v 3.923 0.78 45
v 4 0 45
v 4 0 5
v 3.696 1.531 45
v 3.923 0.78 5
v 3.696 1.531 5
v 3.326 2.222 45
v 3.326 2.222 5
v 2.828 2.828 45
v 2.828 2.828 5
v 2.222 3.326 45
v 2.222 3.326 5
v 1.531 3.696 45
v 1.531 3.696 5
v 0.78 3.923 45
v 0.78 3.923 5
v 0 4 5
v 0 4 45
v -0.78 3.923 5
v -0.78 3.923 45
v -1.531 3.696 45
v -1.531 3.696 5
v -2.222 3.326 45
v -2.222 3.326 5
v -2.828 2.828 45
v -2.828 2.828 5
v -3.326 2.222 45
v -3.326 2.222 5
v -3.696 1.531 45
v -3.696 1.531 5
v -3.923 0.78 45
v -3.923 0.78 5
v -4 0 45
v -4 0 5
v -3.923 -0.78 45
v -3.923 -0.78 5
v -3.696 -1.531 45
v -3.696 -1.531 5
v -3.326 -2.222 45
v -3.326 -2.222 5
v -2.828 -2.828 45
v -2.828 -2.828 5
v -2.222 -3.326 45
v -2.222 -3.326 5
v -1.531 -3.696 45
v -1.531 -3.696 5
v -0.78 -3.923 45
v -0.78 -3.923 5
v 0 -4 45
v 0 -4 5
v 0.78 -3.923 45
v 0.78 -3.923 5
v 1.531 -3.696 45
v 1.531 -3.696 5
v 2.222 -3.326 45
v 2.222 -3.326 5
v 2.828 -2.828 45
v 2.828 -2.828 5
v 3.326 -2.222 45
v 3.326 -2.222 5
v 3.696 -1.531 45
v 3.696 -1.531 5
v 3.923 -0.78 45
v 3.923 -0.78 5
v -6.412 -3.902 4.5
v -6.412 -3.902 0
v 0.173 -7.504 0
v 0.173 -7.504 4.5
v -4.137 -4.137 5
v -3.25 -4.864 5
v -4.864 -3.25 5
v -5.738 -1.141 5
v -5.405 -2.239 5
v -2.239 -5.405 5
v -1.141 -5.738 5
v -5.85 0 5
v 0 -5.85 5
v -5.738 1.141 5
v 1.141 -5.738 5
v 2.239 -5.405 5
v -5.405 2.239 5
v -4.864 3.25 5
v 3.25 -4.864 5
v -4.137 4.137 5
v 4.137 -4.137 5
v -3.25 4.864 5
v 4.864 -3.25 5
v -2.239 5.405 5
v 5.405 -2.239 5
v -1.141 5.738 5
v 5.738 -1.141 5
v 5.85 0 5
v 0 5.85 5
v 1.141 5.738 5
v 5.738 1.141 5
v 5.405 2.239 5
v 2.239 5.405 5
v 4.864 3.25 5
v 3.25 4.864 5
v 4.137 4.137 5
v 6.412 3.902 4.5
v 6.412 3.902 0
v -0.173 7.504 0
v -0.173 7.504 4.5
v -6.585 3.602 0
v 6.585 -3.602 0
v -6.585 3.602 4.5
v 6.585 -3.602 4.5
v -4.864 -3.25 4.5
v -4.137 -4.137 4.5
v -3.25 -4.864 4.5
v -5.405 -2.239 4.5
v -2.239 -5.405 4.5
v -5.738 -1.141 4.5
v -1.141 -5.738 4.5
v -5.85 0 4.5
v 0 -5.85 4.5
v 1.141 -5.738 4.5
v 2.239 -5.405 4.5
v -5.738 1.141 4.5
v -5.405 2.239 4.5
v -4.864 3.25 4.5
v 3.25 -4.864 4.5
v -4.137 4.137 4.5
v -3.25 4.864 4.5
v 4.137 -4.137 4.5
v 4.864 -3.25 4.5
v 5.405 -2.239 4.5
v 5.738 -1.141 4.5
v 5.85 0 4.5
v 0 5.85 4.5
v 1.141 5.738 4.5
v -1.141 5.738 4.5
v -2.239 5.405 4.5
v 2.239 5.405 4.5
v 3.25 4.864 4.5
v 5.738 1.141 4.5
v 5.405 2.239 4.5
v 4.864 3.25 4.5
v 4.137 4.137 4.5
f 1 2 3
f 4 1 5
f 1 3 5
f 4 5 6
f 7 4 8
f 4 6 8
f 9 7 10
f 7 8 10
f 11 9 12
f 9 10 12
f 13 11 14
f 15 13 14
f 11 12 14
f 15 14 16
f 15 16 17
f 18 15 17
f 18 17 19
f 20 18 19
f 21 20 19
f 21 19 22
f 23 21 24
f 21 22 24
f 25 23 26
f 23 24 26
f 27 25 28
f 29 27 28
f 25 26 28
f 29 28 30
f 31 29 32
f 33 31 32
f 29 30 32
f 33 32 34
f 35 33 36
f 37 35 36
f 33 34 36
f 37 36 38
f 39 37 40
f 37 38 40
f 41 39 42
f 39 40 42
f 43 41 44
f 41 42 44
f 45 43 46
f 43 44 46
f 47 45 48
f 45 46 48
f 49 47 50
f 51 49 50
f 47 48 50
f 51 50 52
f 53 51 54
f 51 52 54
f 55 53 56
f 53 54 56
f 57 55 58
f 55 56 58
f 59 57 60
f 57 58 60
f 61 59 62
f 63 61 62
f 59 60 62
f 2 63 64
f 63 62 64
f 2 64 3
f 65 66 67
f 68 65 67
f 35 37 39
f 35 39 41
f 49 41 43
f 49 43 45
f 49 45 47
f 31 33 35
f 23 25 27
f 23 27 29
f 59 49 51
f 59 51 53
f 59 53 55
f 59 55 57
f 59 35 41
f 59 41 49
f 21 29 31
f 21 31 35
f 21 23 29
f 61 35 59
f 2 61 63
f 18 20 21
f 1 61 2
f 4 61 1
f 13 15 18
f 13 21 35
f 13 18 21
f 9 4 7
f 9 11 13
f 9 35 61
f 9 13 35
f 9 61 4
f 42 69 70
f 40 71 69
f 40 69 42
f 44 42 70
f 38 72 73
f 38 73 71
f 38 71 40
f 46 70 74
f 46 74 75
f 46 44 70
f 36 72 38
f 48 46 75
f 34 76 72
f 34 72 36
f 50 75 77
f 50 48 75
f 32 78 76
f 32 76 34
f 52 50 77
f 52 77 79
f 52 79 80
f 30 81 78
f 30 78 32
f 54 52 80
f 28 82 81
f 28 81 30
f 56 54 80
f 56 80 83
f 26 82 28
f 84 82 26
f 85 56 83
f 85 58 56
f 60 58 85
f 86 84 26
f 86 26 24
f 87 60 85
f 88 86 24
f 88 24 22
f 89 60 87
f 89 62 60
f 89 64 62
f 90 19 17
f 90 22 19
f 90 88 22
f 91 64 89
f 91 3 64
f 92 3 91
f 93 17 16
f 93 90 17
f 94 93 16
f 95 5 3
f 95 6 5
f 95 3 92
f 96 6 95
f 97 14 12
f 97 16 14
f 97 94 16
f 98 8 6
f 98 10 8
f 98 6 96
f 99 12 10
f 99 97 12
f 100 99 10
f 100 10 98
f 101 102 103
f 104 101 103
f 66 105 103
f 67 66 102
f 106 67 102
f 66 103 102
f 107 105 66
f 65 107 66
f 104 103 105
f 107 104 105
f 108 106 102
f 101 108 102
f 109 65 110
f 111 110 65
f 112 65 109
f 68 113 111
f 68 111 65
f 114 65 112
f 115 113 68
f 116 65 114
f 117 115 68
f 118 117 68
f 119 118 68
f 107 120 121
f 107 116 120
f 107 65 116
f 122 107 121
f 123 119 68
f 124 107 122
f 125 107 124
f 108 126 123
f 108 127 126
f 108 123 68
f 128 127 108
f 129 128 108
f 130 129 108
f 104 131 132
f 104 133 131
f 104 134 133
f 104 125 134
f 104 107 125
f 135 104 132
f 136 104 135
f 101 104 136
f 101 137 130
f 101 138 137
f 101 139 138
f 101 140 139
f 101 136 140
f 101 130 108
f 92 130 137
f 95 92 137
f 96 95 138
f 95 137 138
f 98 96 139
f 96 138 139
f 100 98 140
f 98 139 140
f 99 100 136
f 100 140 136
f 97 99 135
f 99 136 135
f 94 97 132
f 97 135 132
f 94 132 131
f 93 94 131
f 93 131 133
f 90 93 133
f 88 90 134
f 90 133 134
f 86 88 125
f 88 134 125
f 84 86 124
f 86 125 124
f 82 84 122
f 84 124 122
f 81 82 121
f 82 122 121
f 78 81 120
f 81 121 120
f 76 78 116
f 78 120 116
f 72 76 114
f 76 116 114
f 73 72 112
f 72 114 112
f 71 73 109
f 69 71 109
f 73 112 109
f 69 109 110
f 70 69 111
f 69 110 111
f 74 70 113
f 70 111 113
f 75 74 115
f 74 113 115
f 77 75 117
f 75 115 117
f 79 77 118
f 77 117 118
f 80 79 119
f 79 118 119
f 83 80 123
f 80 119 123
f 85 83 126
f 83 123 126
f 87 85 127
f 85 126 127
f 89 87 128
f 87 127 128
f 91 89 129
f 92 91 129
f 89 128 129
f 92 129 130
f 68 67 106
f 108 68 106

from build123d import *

# Parameters (mm, degrees)
BOSS_EXTRUDE1_DEPTH = 4.5
SKETCH2_R           = 5.85
BOSS_EXTRUDE2_DEPTH = 0.5
SKETCH3_R           = 4
BOSS_EXTRUDE3_DEPTH = 40


with BuildPart() as part:
    # Sketch1 → Boss-Extrude1 (new body)
    with BuildSketch(Plane.XY):
        Polygon((-6.411545587, -3.901975976), (0.173437527, -7.503549344), (6.584983114, -3.601573368), (6.411545587, 3.901975976), (-0.173437527, 7.503549344), (-6.584983114, 3.601573368), align=None)
    extrude(amount=BOSS_EXTRUDE1_DEPTH)

    # Sketch2 → Boss-Extrude2 (add)
    with BuildSketch(Plane.XY.offset(4.5)):
        Circle(SKETCH2_R)
    extrude(amount=BOSS_EXTRUDE2_DEPTH)

    # Sketch3 → Boss-Extrude3 (add)
    with BuildSketch(Plane.XY.offset(5)):
        Circle(SKETCH3_R)
    extrude(amount=BOSS_EXTRUDE3_DEPTH)


solid = part.part
